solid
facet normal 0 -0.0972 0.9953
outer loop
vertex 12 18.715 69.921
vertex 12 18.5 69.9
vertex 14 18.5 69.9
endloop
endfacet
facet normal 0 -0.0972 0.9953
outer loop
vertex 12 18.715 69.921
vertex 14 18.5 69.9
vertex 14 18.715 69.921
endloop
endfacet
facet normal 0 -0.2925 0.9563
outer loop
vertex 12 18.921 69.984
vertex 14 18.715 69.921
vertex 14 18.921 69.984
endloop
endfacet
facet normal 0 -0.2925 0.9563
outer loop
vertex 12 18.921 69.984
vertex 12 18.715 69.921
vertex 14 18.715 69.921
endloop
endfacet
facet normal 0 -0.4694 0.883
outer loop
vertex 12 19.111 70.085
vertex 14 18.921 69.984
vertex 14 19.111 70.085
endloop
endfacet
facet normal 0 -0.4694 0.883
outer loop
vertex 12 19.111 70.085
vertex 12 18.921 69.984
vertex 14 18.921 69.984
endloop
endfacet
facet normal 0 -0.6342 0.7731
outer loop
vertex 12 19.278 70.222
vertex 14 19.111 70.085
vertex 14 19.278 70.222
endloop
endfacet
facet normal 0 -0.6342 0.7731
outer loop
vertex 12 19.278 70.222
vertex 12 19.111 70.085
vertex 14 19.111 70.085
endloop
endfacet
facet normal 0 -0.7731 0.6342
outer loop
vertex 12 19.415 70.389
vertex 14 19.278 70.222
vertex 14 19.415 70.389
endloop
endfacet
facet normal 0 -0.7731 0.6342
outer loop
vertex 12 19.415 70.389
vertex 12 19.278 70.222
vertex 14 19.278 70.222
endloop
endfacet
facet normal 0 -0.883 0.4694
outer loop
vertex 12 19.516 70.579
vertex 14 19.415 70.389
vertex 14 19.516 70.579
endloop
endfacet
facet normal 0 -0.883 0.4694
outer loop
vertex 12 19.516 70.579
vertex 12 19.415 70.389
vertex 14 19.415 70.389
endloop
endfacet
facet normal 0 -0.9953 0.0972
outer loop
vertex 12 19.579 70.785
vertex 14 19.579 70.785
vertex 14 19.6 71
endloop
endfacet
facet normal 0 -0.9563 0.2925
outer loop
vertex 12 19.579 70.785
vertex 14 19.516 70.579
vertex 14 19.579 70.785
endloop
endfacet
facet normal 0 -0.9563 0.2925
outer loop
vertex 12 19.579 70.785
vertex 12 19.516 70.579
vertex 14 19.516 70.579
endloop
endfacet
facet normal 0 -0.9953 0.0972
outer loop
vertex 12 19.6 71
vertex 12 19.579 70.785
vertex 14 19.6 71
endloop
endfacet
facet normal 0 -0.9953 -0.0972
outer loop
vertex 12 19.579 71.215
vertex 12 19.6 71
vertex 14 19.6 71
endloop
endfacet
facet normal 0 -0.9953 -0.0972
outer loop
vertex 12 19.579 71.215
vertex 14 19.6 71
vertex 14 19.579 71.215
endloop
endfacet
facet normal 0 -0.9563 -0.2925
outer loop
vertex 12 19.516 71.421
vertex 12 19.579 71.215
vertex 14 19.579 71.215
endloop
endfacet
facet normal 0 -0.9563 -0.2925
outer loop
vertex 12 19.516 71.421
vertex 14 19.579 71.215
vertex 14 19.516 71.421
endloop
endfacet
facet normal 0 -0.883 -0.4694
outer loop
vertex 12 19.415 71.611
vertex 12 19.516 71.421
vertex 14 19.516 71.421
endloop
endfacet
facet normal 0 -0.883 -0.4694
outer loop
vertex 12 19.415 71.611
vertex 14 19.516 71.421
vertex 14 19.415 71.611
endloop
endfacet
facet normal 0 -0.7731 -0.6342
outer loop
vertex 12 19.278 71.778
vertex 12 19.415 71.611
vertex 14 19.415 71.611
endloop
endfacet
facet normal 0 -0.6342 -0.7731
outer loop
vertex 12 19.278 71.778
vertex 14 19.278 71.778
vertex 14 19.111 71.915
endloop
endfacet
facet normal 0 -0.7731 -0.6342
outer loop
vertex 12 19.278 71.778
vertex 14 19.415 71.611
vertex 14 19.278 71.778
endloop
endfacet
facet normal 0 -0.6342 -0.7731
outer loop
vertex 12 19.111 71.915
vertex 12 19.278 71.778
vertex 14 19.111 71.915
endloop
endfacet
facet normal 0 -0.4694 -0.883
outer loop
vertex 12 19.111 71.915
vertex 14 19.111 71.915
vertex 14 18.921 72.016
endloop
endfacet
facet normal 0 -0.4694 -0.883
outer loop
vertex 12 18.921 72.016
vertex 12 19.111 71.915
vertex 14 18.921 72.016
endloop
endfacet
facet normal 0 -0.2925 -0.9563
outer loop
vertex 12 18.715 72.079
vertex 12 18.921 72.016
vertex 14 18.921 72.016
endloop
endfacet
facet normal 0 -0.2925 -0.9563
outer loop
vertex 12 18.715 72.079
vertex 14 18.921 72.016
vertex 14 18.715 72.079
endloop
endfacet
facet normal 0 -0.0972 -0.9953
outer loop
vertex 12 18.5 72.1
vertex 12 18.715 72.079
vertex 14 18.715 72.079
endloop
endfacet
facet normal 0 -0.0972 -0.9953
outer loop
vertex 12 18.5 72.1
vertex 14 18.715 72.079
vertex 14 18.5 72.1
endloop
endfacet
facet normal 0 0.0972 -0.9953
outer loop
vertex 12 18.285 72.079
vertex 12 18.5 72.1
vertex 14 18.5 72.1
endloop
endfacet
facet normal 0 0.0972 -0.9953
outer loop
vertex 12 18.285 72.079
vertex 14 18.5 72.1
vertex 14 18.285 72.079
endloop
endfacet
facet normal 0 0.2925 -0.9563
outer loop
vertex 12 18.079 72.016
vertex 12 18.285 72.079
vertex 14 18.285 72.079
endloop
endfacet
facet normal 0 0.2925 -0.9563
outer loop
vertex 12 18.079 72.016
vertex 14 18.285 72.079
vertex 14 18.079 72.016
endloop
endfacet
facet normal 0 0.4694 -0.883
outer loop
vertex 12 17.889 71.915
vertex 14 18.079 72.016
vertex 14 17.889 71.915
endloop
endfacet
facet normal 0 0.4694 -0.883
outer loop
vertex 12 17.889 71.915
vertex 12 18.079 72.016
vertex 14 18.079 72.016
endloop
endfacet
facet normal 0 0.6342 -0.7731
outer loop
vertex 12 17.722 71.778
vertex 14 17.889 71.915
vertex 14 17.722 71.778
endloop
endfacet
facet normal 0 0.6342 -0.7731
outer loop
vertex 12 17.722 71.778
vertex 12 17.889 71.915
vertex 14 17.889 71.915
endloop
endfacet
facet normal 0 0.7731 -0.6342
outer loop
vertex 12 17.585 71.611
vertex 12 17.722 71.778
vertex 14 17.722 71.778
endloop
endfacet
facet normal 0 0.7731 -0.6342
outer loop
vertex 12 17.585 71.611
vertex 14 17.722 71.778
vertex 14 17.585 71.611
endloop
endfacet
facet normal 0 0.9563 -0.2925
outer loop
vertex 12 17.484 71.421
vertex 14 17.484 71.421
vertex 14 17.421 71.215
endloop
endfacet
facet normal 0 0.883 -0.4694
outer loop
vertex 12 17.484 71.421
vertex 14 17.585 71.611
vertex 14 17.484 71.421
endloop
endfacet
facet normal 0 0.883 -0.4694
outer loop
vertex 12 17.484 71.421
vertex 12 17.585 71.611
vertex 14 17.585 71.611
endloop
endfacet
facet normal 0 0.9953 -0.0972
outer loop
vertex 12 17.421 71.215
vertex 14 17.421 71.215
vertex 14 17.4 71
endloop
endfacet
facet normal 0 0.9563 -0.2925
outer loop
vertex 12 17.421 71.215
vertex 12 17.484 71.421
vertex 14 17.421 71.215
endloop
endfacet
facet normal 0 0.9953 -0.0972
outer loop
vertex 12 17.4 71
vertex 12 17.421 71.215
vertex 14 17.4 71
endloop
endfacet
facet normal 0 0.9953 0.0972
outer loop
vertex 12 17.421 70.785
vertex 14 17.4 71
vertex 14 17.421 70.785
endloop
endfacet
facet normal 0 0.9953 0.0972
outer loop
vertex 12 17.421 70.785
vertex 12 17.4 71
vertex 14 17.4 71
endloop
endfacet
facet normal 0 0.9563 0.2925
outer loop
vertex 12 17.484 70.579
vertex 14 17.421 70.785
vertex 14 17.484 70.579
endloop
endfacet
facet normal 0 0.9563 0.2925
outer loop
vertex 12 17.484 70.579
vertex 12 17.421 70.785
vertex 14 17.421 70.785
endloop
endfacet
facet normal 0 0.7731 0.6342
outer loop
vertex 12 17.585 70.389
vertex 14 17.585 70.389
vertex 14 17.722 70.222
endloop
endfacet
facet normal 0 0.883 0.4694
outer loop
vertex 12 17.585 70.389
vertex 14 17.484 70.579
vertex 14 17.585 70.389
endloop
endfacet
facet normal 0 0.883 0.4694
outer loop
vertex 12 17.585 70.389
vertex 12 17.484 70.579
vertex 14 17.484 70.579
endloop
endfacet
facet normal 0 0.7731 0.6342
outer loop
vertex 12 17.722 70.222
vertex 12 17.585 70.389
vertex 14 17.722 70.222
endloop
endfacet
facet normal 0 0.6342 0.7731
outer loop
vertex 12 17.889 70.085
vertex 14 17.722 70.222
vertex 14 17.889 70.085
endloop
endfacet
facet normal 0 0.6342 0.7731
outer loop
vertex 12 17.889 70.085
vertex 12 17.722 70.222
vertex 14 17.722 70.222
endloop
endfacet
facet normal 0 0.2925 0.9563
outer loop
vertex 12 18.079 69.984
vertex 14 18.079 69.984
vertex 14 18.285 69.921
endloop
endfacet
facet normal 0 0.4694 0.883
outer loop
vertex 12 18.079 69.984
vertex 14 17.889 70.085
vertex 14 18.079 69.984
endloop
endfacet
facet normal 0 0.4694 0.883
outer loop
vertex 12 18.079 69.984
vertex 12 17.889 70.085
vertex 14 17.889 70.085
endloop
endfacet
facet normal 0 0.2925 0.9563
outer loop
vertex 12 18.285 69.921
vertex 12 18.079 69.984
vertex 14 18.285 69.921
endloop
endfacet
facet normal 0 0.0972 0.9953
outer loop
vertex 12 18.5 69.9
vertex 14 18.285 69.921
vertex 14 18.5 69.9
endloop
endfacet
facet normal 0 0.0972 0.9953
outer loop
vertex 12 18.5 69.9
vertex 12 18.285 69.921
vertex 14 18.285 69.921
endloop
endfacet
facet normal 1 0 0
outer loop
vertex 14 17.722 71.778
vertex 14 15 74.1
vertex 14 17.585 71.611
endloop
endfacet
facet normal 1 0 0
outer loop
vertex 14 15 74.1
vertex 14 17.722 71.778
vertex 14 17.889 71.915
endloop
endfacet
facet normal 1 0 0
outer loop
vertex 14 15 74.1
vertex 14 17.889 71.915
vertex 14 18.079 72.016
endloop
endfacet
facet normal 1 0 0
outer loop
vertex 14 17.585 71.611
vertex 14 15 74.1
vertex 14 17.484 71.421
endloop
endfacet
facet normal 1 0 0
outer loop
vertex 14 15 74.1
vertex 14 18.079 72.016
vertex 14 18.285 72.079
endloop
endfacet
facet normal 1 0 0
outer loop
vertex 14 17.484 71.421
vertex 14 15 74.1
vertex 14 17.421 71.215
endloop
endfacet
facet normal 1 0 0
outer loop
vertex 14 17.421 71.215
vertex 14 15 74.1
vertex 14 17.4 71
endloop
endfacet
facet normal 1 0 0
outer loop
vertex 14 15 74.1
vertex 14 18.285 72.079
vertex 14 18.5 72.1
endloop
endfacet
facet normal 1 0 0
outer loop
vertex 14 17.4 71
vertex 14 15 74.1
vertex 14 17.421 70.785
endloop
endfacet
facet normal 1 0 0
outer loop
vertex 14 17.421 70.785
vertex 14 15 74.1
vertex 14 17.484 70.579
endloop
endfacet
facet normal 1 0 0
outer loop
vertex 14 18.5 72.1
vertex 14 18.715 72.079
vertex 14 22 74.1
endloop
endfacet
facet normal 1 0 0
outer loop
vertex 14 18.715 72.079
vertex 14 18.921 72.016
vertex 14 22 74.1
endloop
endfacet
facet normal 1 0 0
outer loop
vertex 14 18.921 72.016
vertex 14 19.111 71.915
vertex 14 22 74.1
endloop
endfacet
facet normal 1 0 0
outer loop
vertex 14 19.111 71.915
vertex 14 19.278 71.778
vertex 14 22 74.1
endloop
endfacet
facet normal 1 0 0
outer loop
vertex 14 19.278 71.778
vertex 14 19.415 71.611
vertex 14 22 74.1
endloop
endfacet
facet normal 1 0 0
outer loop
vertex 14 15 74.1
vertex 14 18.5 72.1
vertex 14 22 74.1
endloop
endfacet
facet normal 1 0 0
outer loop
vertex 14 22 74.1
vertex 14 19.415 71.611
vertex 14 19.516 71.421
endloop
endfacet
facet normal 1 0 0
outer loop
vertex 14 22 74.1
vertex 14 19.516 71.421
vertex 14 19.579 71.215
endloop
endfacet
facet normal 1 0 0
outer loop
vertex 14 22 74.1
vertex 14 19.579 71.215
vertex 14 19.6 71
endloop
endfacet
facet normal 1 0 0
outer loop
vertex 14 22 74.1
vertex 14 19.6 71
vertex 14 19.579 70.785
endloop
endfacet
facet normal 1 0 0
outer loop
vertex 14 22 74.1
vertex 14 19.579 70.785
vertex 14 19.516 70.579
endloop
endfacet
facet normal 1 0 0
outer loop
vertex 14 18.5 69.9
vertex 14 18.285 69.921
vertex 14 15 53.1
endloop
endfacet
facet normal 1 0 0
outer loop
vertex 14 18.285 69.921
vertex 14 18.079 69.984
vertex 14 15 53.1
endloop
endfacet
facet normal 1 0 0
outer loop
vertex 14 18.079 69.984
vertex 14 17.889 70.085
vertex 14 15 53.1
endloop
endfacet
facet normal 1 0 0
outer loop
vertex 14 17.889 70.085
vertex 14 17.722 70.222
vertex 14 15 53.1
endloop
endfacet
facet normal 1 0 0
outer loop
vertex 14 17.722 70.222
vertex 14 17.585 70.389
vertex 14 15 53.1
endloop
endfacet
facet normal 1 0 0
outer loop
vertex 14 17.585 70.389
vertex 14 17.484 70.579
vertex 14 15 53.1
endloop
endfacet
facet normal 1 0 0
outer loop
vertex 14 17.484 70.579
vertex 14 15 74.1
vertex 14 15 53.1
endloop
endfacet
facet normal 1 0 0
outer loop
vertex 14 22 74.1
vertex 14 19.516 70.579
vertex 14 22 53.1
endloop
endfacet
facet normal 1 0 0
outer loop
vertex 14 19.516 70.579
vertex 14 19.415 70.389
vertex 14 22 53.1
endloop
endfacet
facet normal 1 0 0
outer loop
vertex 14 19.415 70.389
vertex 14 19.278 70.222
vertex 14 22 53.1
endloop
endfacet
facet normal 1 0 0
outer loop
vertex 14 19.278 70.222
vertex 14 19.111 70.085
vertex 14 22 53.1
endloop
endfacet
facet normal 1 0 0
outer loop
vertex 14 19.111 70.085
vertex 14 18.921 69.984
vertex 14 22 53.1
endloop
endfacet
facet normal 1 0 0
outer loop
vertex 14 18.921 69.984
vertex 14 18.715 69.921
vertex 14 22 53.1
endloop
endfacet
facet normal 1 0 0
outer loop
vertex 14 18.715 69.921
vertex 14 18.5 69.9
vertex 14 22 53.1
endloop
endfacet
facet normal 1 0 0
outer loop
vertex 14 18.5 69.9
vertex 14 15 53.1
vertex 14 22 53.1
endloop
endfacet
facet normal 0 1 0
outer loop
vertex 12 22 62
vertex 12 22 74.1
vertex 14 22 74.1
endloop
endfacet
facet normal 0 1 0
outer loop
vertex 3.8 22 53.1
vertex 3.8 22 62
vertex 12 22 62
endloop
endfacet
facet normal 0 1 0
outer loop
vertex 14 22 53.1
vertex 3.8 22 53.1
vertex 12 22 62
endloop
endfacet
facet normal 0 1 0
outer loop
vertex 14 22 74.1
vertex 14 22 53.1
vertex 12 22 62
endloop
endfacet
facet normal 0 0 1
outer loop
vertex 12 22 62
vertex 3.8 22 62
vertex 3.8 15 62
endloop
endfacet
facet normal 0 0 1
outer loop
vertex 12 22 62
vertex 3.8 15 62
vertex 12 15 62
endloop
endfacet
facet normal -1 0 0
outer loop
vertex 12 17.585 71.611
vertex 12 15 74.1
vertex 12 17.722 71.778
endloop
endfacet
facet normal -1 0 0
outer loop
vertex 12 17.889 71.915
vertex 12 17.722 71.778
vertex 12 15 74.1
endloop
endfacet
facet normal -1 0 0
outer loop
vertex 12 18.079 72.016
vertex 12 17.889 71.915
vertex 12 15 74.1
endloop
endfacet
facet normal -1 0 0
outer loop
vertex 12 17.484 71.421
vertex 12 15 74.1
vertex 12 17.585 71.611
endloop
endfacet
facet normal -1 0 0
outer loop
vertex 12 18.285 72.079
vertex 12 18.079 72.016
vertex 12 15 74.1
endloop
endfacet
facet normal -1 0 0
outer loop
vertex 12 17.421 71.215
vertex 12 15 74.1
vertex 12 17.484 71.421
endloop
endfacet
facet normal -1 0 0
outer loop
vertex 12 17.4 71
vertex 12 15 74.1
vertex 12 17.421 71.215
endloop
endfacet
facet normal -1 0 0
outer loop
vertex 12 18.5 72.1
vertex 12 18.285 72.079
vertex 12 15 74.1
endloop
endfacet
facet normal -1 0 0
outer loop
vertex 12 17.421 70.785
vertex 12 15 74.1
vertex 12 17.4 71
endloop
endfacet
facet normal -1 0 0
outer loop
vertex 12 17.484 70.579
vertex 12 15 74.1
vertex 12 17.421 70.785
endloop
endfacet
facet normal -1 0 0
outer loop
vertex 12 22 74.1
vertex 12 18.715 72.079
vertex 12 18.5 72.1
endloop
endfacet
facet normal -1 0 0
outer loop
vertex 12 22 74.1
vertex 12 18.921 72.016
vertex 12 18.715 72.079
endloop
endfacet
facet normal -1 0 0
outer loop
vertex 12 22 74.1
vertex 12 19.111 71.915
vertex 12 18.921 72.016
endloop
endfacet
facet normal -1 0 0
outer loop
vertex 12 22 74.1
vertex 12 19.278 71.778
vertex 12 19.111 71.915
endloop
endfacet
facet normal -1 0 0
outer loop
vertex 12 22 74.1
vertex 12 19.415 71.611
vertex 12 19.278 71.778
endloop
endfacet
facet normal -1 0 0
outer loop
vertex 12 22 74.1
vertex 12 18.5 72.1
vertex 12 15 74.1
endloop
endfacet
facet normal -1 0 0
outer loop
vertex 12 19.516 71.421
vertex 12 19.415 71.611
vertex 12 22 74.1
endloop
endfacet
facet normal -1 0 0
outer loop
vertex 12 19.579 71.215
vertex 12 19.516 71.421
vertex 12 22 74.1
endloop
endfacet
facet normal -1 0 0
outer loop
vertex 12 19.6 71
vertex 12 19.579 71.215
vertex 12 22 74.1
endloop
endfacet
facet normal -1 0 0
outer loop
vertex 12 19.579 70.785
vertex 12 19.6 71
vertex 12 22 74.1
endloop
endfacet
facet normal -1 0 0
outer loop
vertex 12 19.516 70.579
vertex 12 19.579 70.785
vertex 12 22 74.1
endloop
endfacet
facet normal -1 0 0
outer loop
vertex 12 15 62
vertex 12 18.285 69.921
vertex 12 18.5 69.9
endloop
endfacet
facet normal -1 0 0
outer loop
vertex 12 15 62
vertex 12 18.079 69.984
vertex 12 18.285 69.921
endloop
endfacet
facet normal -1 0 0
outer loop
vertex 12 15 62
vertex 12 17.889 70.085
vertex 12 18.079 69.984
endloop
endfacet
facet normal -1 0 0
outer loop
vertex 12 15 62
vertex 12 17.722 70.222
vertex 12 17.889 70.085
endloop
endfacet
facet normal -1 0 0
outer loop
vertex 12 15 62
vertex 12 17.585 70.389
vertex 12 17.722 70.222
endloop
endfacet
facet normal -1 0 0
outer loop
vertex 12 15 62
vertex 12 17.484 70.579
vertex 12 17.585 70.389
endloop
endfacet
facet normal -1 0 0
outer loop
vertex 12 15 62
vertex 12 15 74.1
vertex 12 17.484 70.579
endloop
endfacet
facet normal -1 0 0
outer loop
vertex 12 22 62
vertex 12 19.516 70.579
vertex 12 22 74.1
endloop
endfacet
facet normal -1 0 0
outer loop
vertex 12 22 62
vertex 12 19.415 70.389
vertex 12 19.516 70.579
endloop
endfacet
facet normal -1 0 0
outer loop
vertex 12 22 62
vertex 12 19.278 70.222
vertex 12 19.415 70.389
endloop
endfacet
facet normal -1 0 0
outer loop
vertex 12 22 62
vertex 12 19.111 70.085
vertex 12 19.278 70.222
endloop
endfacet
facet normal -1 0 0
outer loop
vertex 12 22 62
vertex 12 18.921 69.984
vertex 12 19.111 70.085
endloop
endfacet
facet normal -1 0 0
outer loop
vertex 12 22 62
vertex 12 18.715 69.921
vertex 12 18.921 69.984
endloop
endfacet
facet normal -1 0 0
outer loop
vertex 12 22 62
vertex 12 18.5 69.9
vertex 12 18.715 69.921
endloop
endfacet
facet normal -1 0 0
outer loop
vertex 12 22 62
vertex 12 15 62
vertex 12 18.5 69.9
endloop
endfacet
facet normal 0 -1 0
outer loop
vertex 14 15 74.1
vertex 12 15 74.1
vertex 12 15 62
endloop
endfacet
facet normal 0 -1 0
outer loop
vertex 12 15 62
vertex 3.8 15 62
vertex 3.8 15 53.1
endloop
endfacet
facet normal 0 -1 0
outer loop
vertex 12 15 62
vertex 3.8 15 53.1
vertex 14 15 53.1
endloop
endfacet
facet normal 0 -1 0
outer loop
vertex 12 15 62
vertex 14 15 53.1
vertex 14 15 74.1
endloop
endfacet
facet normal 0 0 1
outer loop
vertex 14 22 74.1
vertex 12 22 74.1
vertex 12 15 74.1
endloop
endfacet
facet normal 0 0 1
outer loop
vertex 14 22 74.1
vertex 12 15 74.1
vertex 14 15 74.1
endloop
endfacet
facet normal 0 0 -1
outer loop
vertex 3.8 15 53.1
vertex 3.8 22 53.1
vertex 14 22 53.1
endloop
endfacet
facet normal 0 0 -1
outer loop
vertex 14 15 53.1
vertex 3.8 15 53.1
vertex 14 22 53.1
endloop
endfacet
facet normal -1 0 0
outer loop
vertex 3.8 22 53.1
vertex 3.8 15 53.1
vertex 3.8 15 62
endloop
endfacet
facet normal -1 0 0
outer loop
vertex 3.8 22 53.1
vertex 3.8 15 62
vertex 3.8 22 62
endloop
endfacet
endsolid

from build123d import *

# Parameters (mm, degrees)
CYLINDER104_R     = 1.1
CYLINDER104_DEPTH = 21
BOX102_W          = 2
BOX102_H          = 7
BOX102_DEPTH      = 21
BOX100_W          = 8.2
BOX100_H          = 7
BOX100_DEPTH      = 8.9


with BuildPart() as cylinder104:
    # Cylinder104 → Cylinder104 (new body)
    with BuildSketch(Plane(origin=(7, 18.5, 71), x_dir=(0, 0, -1), z_dir=(1, 0, 0))):
        Circle(CYLINDER104_R)
    extrude(amount=CYLINDER104_DEPTH)


with BuildPart() as cut068:
    # Box102 → Box102 (new body)
    with BuildSketch(Plane(origin=(12, 15, 53.1), x_dir=(1, 0, 0), z_dir=(0, 0, 1))):
        with Locations((1, 3.5)):
            Rectangle(BOX102_W, BOX102_H)
    extrude(amount=BOX102_DEPTH)

    # Cut068: cut Cylinder104
    add(cylinder104.part, mode=Mode.SUBTRACT)


with BuildPart() as cap:
    # Box100 → Box100 (new body)
    with BuildSketch(Plane(origin=(3.8, 15, 53.1), x_dir=(1, 0, 0), z_dir=(0, 0, 1))):
        with Locations((4.1, 3.5)):
            Rectangle(BOX100_W, BOX100_H)
    extrude(amount=BOX100_DEPTH)

    # Fusion088: union Cut068
    add(cut068.part)


solid = cap.part
